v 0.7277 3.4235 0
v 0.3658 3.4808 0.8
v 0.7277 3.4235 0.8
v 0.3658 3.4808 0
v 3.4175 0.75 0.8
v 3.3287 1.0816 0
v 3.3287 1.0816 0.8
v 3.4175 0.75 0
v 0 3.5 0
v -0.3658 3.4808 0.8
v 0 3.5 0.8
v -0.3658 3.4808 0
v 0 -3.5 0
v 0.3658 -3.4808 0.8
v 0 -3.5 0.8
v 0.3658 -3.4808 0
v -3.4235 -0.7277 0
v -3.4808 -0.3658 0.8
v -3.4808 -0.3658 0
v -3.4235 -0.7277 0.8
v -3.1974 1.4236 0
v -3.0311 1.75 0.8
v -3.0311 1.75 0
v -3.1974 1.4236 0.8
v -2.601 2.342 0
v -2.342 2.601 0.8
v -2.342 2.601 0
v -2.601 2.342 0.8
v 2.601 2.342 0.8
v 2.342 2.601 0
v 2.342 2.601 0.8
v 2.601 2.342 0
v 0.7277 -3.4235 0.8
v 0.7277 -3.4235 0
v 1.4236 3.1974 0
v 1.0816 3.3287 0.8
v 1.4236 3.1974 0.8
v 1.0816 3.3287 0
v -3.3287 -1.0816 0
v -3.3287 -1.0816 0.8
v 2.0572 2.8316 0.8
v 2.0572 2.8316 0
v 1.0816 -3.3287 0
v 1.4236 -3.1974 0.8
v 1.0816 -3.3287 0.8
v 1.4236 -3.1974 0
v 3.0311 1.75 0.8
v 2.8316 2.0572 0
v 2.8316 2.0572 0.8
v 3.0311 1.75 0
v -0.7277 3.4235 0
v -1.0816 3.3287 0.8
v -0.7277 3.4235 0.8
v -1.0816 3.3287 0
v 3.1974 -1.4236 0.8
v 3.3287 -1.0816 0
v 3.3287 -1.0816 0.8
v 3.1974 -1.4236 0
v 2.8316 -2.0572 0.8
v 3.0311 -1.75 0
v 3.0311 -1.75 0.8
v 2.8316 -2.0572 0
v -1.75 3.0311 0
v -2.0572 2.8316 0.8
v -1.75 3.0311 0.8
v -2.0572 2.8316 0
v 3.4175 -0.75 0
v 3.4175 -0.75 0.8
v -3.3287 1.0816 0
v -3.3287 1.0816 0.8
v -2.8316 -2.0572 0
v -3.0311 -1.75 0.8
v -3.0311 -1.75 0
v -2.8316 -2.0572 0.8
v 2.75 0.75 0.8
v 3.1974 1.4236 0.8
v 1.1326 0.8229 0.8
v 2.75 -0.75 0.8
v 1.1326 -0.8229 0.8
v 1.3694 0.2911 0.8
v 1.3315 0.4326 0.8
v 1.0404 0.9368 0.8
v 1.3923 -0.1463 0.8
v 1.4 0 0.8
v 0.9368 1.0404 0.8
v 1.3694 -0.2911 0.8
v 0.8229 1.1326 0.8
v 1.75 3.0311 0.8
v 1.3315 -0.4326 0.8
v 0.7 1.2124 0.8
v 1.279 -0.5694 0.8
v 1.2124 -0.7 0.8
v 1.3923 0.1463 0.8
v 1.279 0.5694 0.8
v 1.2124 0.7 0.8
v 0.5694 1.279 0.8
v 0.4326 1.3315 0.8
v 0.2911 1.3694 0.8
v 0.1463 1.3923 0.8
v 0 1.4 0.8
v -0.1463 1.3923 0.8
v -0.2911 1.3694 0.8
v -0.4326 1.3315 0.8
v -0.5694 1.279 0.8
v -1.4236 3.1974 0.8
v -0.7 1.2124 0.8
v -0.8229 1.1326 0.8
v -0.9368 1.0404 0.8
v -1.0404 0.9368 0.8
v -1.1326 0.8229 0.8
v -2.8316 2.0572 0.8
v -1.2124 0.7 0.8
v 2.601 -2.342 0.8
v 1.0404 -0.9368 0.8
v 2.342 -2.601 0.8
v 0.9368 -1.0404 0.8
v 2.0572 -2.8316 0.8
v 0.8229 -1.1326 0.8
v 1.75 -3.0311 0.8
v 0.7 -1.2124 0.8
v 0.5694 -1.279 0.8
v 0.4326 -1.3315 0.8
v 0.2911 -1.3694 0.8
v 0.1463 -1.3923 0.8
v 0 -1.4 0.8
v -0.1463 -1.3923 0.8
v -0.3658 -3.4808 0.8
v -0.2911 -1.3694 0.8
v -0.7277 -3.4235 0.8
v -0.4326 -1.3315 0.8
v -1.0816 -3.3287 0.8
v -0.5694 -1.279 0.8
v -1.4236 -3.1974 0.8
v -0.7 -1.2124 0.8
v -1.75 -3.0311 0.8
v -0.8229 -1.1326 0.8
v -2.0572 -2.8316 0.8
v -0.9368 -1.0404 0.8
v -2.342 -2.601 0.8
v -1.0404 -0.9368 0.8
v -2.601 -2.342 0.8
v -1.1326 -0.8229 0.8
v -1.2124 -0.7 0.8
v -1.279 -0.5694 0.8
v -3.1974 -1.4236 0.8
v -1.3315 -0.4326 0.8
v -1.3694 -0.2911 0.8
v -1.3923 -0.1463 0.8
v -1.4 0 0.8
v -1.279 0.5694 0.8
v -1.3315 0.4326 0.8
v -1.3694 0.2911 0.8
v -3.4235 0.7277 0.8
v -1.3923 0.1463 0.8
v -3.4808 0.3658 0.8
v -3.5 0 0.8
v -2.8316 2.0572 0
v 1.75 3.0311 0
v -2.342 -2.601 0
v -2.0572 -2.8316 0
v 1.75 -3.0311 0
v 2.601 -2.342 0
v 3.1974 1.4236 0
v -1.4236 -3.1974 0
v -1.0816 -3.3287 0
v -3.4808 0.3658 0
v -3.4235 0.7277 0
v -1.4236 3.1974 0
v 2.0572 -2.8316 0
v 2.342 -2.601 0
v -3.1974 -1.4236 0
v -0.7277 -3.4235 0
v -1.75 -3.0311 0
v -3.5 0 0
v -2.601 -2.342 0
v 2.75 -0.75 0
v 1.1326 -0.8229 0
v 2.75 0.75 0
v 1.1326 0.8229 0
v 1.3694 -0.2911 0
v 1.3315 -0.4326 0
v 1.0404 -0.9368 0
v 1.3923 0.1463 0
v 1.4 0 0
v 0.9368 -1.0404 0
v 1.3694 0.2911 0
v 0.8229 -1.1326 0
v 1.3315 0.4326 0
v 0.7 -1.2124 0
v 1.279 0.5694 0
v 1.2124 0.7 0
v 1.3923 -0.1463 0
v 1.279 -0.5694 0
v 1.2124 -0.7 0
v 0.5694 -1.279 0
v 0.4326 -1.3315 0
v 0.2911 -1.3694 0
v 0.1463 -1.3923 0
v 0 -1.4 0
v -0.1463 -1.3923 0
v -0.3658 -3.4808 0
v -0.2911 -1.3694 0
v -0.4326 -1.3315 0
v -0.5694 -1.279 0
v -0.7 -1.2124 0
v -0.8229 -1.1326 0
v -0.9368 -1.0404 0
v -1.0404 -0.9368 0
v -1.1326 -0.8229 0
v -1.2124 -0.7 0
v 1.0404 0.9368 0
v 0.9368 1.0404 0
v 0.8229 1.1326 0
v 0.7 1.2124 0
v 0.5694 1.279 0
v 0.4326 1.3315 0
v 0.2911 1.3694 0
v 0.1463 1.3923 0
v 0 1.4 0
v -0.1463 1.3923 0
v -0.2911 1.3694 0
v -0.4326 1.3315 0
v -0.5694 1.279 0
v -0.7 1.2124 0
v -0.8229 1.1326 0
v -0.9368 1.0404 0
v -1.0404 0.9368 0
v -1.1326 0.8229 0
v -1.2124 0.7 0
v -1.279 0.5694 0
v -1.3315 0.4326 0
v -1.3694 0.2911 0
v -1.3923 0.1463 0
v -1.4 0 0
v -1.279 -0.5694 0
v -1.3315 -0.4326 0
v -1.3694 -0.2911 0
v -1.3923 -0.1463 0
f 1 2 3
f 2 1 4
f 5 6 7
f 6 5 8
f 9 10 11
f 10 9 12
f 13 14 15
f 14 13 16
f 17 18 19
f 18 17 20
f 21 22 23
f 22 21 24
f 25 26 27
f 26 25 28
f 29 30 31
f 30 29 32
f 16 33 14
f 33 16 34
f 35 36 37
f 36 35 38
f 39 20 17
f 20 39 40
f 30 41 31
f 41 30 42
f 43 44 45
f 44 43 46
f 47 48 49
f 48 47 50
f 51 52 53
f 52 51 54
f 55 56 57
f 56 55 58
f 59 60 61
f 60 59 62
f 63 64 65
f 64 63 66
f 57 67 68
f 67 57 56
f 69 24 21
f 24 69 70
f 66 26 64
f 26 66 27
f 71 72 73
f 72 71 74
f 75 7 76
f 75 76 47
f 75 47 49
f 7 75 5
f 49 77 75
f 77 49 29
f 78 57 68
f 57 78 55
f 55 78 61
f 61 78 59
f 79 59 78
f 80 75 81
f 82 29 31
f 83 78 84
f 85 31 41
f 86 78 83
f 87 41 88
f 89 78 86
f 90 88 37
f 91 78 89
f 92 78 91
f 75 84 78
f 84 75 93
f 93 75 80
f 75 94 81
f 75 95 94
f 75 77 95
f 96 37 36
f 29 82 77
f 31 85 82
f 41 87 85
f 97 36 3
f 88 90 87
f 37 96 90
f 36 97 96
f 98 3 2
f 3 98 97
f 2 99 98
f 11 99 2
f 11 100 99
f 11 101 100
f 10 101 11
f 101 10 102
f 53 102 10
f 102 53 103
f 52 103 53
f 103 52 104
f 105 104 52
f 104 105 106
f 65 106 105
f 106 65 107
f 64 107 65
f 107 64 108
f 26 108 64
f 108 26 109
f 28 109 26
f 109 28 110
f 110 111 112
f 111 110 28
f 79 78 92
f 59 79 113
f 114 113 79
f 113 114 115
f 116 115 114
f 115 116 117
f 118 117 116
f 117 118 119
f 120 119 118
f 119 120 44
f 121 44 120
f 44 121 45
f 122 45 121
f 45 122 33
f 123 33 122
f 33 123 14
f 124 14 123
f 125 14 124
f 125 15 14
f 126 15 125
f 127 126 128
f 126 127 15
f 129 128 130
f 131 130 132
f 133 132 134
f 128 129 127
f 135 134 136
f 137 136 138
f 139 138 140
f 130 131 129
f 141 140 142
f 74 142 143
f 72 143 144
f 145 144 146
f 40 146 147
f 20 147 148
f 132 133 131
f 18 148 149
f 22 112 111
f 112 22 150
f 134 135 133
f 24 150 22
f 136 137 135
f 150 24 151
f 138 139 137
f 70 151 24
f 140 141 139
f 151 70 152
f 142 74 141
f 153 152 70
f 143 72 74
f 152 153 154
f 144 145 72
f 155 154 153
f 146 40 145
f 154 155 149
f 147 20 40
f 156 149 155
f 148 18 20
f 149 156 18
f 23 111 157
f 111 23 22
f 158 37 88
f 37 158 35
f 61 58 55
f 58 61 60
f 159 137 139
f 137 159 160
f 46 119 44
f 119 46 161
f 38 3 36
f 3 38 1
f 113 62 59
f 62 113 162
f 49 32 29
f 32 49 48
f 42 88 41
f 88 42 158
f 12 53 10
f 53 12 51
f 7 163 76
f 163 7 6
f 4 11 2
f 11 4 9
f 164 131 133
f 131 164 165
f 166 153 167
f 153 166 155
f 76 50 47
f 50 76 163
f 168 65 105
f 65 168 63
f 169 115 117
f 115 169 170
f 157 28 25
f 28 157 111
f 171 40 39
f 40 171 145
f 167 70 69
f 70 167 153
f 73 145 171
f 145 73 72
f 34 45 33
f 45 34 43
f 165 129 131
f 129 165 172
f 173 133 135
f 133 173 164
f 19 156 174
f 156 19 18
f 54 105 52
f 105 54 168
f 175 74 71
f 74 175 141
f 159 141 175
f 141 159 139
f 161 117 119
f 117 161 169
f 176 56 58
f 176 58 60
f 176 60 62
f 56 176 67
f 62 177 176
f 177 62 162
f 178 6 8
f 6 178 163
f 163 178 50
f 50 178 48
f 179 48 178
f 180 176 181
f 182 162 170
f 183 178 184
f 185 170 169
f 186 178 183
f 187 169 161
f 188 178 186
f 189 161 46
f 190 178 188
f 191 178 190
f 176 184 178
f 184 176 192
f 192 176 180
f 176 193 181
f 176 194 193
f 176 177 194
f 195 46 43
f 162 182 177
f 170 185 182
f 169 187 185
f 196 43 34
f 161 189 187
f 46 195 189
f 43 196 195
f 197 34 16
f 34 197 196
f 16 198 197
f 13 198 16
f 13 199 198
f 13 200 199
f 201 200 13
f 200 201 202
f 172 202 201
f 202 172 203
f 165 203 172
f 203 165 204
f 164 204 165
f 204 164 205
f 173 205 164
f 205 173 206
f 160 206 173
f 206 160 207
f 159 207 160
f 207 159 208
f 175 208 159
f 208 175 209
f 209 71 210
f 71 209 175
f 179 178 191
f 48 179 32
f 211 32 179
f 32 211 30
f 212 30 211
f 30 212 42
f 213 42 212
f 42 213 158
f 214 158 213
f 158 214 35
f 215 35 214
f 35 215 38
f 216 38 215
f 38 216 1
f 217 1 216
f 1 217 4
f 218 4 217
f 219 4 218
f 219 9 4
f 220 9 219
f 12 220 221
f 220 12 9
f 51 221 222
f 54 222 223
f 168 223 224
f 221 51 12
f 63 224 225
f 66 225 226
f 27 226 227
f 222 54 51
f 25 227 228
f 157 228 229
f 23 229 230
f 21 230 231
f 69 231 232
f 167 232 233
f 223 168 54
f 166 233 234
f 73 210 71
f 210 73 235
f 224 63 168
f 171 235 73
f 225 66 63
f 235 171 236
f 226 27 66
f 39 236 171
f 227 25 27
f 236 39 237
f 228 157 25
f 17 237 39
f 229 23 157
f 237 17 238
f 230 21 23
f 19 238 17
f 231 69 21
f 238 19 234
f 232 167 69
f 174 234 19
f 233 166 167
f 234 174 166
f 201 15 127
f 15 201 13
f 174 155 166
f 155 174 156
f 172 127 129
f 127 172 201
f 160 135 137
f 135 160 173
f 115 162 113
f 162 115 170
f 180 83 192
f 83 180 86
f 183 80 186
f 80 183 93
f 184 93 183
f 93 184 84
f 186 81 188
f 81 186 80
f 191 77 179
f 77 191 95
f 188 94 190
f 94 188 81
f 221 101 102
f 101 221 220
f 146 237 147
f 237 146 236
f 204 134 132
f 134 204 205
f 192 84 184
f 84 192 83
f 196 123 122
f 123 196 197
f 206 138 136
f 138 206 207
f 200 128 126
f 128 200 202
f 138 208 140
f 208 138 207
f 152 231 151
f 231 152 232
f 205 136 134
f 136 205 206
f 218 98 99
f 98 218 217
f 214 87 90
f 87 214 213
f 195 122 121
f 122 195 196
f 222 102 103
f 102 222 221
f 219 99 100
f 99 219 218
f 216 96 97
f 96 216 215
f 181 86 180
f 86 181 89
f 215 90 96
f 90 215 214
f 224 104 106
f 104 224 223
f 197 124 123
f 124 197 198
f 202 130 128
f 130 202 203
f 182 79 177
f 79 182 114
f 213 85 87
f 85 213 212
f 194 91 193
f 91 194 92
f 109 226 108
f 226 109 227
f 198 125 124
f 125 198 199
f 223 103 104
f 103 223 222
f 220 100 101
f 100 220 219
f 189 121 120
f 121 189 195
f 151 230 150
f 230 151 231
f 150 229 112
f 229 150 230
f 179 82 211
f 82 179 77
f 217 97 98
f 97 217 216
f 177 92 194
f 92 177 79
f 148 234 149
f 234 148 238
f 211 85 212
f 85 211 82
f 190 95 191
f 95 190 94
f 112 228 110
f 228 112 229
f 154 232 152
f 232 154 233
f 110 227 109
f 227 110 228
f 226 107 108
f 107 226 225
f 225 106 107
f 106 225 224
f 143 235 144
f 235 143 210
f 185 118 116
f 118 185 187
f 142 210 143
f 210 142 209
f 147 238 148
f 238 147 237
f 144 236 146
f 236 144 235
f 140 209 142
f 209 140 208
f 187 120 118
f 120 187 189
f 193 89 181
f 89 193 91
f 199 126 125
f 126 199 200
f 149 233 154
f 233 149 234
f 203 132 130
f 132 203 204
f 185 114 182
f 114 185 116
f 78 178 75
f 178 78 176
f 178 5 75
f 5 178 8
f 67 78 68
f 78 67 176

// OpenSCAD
// Split lock washer.
$fn = 60;
eps = 0.02;
inner_d = 2.8;
outer_d = 7;
thickness = 0.8;
gap = 1.5;
difference() {
    cylinder(d=outer_d,h=thickness);
    translate([0,0,-eps]) cylinder(d=inner_d,h=thickness+2*eps);
    translate([outer_d/2-gap/2,-gap/2,-eps]) cube([gap+eps,gap,thickness+2*eps]);
}
